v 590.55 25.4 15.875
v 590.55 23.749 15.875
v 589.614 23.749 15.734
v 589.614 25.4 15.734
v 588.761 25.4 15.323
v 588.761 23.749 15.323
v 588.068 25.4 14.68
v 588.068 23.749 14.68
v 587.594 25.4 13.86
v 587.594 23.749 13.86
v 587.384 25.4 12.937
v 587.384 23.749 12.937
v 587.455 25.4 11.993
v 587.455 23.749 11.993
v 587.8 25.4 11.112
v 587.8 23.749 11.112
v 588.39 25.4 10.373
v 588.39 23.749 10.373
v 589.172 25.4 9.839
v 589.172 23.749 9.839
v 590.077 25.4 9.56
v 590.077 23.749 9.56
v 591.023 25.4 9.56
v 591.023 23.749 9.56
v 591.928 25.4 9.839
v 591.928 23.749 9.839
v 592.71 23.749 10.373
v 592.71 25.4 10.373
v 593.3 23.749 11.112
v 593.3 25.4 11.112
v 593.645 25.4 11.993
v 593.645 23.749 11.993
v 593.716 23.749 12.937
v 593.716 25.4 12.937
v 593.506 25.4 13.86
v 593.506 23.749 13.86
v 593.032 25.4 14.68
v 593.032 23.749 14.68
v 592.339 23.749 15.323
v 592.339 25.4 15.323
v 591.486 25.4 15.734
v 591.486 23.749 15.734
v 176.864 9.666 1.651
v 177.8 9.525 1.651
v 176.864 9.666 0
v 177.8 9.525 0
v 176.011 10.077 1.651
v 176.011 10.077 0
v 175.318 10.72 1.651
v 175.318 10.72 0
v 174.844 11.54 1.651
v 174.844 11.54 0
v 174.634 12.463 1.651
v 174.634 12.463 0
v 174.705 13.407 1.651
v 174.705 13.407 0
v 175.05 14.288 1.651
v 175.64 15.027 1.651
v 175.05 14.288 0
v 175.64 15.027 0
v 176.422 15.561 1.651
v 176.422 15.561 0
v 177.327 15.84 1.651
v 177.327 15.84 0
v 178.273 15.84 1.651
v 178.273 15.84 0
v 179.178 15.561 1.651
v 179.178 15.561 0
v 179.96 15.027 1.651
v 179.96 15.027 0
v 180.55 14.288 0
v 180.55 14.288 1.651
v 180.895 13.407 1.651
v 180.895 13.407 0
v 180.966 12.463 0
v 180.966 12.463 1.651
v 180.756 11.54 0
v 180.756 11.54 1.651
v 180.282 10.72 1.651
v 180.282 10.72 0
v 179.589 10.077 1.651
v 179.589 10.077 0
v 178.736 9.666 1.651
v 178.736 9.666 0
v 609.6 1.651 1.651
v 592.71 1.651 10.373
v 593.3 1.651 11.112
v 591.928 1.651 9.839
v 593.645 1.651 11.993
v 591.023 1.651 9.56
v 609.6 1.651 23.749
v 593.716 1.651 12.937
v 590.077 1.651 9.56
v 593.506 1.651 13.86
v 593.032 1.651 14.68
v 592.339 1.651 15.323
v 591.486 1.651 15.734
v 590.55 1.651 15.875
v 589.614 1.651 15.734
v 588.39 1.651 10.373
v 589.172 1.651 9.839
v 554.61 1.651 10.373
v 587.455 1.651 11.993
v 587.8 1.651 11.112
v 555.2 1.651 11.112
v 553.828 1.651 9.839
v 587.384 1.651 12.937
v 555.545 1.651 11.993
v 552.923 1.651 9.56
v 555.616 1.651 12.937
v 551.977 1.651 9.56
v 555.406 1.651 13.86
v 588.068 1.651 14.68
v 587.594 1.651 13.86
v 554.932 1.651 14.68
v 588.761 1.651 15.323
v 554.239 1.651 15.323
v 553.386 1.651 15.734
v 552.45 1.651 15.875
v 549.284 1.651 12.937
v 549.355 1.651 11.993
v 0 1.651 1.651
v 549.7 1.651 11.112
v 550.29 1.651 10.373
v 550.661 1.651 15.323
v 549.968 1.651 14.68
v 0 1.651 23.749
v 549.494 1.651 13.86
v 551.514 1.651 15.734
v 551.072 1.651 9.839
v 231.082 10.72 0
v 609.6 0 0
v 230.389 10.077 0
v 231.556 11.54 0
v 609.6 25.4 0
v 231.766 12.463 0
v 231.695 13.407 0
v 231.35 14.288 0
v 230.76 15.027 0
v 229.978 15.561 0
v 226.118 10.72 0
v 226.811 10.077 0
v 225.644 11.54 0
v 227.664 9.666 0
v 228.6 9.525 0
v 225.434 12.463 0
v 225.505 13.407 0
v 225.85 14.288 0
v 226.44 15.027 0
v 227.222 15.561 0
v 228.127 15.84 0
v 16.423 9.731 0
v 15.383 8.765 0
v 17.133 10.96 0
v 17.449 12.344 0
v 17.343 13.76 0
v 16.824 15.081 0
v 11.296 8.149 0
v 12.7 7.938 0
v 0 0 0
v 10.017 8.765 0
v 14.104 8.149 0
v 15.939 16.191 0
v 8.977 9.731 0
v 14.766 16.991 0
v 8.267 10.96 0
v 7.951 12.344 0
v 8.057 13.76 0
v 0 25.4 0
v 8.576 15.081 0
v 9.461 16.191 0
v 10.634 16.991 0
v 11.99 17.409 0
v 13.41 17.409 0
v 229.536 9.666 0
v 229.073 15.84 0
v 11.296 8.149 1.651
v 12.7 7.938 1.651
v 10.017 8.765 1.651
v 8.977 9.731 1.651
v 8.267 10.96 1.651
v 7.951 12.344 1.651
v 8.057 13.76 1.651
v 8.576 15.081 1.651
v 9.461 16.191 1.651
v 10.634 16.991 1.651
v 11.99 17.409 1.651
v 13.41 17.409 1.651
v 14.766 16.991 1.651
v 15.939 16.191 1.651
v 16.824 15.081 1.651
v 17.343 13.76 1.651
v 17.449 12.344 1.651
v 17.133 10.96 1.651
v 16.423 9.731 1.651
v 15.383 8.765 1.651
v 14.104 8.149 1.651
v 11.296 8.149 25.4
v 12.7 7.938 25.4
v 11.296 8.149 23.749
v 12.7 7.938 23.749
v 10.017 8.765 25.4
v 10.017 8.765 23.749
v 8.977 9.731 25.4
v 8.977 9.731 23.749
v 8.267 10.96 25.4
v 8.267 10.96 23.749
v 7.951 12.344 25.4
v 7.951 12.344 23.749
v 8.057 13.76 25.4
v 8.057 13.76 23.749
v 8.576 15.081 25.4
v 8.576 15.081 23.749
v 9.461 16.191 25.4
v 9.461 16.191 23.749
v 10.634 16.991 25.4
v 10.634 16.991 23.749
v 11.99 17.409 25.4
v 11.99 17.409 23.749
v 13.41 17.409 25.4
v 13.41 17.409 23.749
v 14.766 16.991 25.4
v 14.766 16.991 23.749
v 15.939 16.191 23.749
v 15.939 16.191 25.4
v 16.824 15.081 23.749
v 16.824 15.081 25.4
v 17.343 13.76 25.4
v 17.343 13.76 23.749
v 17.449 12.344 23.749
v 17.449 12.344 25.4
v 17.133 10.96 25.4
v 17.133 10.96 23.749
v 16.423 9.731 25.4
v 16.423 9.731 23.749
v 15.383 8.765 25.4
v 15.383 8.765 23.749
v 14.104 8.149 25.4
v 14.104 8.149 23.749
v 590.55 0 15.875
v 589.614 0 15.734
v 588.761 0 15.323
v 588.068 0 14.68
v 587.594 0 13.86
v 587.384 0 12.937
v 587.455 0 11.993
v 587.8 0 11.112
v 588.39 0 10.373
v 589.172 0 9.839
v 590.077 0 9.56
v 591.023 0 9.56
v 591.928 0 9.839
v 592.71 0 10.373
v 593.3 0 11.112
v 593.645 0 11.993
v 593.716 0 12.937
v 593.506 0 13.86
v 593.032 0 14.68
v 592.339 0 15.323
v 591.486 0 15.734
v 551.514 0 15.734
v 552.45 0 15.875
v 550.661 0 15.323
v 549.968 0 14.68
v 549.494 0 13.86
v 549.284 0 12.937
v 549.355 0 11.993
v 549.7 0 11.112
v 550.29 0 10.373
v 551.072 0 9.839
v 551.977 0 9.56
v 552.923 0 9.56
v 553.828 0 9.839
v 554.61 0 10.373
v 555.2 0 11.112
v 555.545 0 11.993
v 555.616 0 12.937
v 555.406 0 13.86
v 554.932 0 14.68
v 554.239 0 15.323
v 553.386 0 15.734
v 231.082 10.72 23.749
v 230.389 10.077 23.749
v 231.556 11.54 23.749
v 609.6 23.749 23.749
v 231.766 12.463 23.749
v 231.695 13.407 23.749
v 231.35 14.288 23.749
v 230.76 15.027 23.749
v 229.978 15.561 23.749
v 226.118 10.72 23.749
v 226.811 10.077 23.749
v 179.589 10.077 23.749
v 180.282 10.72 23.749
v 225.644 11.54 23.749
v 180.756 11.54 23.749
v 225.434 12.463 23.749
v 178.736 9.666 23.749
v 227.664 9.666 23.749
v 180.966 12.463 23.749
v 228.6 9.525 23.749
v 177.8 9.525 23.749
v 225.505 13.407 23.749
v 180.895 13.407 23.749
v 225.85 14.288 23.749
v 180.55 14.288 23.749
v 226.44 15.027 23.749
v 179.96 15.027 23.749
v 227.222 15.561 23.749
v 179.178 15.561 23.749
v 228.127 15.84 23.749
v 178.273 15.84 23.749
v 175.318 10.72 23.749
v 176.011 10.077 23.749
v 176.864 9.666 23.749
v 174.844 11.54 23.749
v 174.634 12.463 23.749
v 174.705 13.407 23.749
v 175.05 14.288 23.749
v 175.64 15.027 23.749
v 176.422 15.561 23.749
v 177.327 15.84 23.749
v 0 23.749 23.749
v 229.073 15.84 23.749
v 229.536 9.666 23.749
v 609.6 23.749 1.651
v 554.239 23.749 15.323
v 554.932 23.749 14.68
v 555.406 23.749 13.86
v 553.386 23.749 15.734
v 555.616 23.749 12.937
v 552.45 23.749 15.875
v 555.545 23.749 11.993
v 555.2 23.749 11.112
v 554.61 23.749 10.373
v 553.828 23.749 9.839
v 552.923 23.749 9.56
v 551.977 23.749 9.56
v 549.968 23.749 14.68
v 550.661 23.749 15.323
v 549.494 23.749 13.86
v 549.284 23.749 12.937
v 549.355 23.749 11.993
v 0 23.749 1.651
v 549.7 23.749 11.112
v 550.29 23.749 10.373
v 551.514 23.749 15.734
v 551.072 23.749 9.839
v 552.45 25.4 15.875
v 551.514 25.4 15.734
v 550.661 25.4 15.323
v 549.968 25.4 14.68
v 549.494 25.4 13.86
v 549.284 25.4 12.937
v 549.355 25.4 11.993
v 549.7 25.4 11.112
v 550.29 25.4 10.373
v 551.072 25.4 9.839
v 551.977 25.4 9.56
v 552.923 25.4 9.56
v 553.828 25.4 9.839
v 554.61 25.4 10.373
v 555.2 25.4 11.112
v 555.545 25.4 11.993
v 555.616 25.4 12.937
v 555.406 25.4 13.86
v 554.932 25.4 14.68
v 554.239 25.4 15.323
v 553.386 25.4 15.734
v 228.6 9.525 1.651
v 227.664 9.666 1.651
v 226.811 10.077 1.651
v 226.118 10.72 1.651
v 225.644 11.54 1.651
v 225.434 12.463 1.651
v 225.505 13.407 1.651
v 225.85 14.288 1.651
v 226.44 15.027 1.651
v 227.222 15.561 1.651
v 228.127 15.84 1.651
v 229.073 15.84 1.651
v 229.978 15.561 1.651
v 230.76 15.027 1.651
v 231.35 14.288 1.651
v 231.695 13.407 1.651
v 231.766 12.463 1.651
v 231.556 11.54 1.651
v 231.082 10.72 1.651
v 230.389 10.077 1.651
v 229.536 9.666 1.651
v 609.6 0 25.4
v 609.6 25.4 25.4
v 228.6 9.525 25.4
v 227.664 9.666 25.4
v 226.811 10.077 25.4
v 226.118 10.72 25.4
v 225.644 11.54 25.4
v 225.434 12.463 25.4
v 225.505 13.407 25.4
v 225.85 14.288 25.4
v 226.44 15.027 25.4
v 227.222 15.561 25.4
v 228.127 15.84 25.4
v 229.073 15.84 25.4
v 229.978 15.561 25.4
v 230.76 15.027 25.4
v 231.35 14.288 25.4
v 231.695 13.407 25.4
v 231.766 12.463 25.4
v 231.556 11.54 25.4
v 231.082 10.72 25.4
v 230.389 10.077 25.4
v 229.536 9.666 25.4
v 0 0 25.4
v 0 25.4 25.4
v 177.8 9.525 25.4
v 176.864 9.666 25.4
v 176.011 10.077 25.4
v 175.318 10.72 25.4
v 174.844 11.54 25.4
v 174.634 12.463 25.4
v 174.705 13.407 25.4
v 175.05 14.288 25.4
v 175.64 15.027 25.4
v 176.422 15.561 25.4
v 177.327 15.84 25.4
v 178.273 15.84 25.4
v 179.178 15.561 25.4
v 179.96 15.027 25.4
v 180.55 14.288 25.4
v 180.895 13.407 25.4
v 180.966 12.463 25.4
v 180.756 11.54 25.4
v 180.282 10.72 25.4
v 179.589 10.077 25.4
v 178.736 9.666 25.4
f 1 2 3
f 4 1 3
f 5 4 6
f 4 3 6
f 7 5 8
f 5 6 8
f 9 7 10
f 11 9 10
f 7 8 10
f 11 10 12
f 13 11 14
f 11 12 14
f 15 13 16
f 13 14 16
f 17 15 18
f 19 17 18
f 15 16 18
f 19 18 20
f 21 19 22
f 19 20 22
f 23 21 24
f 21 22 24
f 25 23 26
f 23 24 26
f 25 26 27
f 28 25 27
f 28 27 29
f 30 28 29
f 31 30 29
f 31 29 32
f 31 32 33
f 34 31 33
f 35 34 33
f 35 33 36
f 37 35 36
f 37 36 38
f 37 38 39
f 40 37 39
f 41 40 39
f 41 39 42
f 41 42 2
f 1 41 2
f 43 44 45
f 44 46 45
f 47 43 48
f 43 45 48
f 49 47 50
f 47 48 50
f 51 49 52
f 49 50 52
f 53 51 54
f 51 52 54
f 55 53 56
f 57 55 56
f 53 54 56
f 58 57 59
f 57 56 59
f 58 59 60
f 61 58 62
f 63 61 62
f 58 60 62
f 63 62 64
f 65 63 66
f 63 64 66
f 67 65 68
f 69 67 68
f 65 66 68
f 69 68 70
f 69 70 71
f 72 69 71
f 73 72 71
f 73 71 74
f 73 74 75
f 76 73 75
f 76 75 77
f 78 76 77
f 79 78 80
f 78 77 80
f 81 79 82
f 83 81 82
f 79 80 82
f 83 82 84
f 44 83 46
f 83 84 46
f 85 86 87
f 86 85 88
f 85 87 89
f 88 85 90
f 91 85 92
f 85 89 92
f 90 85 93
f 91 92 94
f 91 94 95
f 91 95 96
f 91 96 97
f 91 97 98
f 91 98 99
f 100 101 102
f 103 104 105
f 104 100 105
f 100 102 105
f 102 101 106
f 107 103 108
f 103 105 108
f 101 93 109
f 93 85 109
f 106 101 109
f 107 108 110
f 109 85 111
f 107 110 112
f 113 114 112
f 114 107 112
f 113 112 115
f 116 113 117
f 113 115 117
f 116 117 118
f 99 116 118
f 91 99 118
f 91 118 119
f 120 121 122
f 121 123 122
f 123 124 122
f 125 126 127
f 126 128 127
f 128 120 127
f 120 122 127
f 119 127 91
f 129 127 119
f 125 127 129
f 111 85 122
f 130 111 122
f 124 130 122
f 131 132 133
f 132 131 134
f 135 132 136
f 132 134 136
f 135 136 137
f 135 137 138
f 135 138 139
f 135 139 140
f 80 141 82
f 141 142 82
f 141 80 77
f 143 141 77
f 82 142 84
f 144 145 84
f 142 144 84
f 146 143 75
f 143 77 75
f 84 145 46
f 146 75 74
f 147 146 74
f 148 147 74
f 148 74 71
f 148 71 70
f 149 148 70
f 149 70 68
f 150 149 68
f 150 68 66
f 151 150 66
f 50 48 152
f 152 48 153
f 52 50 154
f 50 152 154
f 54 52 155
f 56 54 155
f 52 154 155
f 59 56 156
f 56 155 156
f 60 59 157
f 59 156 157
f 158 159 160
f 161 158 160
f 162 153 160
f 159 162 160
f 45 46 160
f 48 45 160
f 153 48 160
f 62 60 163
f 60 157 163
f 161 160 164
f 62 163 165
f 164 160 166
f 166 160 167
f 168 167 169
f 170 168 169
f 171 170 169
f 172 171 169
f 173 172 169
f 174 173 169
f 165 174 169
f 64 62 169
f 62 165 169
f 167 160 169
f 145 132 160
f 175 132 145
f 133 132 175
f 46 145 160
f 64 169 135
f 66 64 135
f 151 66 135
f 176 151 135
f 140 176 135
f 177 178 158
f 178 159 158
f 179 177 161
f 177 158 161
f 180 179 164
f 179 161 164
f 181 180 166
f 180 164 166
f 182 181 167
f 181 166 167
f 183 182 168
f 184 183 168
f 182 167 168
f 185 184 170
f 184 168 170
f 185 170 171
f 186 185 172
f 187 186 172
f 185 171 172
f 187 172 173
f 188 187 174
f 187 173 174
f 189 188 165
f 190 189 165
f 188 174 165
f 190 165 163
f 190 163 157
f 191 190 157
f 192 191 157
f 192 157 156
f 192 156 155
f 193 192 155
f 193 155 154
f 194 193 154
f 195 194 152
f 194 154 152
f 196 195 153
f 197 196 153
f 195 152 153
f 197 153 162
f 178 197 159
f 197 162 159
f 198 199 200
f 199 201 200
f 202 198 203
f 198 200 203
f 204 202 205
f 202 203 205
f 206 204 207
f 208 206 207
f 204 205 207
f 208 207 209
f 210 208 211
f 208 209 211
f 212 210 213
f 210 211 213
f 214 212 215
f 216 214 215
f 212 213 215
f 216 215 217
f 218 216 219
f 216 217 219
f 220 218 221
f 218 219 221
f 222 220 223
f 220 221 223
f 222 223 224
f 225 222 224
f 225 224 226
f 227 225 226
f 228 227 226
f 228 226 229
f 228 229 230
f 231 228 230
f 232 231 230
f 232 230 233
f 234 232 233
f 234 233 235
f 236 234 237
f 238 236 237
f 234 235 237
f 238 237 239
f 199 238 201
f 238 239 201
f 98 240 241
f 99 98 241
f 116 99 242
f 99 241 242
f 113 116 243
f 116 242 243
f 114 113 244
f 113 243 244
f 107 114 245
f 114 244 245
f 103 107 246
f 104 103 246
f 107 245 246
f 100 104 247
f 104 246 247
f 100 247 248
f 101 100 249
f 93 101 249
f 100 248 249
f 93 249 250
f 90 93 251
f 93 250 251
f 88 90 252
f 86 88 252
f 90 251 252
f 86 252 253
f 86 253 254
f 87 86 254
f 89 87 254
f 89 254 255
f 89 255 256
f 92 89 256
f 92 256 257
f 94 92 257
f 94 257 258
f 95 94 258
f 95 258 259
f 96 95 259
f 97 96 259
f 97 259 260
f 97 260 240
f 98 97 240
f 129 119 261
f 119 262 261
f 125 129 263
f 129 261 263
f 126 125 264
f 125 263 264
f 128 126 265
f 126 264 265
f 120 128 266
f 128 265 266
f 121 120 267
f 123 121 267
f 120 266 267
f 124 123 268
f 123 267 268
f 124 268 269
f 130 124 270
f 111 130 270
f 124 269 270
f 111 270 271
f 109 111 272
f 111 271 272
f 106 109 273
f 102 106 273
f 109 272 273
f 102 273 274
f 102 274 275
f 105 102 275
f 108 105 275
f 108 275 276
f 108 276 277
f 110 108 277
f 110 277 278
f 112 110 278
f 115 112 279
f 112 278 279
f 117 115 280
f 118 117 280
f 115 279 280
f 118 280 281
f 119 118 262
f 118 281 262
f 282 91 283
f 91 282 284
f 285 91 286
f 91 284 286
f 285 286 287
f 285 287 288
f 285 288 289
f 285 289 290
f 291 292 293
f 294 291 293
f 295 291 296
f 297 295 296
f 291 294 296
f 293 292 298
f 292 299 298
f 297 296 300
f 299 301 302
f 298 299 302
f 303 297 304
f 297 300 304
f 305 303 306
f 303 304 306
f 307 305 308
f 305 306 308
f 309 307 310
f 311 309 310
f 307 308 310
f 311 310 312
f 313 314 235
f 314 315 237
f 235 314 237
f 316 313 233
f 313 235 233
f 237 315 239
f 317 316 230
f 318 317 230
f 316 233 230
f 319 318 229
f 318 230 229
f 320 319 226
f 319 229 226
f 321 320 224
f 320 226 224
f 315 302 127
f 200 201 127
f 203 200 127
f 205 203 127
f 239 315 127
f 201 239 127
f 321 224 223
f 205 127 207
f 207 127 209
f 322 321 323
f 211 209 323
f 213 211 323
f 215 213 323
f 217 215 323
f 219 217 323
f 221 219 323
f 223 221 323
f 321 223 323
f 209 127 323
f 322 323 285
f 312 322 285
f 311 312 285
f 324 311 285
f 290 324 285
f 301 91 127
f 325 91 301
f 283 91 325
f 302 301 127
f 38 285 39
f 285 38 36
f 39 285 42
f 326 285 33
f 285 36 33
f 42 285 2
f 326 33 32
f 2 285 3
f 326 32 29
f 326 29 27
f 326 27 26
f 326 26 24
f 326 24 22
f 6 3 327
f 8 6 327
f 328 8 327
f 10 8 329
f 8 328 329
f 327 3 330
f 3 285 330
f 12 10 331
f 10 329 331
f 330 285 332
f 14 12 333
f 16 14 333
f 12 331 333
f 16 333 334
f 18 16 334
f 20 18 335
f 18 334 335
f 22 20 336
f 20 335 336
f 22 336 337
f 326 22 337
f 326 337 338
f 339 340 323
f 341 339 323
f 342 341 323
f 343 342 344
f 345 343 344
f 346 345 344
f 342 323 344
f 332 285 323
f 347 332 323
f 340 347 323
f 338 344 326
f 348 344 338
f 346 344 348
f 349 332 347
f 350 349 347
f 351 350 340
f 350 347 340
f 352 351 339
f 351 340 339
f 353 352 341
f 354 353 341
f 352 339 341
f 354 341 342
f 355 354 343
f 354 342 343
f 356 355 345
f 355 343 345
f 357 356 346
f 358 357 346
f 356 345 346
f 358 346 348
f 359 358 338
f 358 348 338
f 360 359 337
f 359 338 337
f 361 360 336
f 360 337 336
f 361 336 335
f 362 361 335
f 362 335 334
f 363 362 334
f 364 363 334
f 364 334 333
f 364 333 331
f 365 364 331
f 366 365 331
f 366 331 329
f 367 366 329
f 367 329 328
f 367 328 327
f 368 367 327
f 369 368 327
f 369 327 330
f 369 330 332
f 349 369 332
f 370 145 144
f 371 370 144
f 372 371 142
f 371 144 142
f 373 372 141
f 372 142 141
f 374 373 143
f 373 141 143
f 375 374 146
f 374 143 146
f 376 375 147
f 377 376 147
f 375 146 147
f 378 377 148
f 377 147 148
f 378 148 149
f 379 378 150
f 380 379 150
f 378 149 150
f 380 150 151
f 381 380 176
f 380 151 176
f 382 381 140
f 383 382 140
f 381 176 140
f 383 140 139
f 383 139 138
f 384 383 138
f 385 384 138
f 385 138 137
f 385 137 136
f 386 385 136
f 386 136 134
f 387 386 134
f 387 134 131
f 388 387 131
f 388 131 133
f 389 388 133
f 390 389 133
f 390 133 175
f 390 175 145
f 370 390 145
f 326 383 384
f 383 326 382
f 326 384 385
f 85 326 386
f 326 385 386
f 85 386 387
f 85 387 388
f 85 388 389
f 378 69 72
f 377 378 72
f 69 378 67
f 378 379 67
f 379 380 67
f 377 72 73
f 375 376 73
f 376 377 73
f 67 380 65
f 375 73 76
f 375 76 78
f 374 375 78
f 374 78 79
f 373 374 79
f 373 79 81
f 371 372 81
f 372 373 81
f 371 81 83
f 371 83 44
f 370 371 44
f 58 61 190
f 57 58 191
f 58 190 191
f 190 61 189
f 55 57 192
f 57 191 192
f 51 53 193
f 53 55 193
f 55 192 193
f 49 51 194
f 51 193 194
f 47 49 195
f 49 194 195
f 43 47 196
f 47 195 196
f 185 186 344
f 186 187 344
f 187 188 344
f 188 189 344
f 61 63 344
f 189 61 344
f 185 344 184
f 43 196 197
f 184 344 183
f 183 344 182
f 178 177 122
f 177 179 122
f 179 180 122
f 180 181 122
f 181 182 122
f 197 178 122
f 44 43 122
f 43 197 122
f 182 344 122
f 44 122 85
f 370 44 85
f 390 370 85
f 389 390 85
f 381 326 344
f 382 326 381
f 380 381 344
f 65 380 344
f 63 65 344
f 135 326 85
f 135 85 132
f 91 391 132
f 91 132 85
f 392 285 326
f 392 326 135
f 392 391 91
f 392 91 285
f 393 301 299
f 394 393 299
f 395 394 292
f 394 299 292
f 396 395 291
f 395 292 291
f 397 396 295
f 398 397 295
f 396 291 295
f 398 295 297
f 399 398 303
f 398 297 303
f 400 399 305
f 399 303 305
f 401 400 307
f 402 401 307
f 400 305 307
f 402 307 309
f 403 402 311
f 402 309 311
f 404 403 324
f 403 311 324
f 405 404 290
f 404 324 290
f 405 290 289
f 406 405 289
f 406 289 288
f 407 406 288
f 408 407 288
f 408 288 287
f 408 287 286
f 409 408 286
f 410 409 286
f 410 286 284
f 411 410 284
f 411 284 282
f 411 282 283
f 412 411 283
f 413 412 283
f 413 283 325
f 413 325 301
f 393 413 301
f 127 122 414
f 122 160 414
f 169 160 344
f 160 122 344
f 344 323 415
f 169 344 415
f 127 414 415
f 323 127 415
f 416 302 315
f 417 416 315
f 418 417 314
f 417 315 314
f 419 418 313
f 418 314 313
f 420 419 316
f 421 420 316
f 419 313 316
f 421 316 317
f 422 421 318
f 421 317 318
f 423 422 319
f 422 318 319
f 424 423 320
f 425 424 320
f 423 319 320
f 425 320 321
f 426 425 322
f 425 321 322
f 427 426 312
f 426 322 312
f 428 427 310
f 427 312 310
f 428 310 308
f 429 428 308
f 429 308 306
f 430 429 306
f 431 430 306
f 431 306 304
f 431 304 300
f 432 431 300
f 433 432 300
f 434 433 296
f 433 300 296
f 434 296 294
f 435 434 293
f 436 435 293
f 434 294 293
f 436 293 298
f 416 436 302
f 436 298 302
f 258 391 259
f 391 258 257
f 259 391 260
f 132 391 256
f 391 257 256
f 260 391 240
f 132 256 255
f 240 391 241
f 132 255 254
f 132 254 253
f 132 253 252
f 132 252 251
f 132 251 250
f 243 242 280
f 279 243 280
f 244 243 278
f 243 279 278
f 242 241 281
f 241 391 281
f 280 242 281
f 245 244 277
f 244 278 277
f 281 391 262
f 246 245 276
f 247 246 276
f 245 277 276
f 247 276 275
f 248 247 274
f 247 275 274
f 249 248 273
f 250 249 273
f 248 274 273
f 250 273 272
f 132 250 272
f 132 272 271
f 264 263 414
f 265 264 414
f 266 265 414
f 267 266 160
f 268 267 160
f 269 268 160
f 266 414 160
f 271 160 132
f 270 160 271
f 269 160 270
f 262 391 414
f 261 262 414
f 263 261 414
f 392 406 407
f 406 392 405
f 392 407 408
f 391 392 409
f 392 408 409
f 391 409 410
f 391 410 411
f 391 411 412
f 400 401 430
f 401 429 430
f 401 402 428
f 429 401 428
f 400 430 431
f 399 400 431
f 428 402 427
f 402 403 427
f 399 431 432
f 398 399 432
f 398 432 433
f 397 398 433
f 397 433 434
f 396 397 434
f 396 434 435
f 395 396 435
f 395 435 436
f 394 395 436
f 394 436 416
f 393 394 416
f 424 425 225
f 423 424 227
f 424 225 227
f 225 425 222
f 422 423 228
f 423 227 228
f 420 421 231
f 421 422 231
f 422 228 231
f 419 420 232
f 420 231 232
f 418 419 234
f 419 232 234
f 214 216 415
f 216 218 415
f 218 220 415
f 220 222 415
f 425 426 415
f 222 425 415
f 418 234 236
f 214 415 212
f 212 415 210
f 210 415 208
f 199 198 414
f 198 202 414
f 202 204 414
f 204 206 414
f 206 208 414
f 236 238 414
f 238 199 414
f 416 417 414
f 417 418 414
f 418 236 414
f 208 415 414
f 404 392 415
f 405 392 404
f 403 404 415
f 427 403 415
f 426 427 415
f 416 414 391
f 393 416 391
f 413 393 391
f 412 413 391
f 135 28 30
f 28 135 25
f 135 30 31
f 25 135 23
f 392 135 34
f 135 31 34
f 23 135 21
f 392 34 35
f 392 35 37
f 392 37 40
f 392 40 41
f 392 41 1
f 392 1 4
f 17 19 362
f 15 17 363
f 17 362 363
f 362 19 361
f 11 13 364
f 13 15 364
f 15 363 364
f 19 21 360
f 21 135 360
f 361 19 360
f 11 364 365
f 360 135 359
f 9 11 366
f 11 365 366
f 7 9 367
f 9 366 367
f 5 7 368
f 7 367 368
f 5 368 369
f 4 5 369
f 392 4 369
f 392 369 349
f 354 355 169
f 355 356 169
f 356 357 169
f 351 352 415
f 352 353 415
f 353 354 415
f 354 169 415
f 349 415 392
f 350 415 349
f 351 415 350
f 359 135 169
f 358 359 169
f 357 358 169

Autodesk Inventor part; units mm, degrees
ref_plane "YZ Plane" through (0, 0, 0) normal (1, 0, 0) x (0, 1, 0)
ref_plane "XZ Plane" through (0, 0, 0) normal (0, 1, 0) x (-1, 0, 0)
ref_plane "XY Plane" through (0, 0, 0) normal (0, 0, 1) x (1, 0, 0)
sketch "Sketch1" plane through (0, 0, 0) normal (1, 0, 0) x (0, 1, 0)
  line L0 (0, 0) -> (25.4, 0)
  line L1 (25.4, 0) -> (25.4, 25.4)
  line L2 (25.4, 25.4) -> (0, 25.4)
  line L3 (0, 25.4) -> (0, 0)
  line L4 (1.651, 23.749) -> (23.749, 23.749)
  line L5 (23.749, 23.749) -> (23.749, 1.651)
  line L6 (23.749, 1.651) -> (1.651, 1.651)
  line L7 (1.651, 1.651) -> (1.651, 23.749)
  dimension "d0" = 25.4
  dimension "d2" = 25.4
  dimension "d3" = 1.651
  dimension "d5" = 1.651
  dimension "d6" = 1.651
  dimension "d7" = 1.651
extrude "Extrusion1" add sketch "Sketch1" along normal blind 609.6
sketch "Sketch2" plane through (0, 0, 25.4) normal (0, 0, 1) x (1, 0, 0)
  line L0 (0, 25.4) -> (0, 0) projected
  line L1 (0, 25.4) -> (609.6, 25.4) projected
  point P0 (12.7, 12.7)
  dimension "d10" = 12.7
  dimension "d11" = 12.7
hole "Hole1" at (12.7, 12.7, 25.4) direction (0, 0, -1) diameter 9.525 end through all
sketch "Sketch3" plane through (0, 25.4, 25.4) normal (0, 1, 0) x (1, 0, 0)
  line L0 (609.6, 25.4) -> (609.6, 0) projected
  point P0 (590.55, 12.7)
  point P1 (552.45, 12.7)
  dimension "d19" = 19.05
  dimension "d20" = 38.1
hole "Hole2" at (590.55, 25.4, 12.7) at (552.45, 25.4, 12.7) direction (0, -1, 0) diameter 6.35 end through all
sketch "Sketch4" plane through (0, 0, 25.4) normal (0, 0, 1) x (1, 0, 0)
  line L0 (0, 25.4) -> (0, 0) projected
  line L1 (0, 0) -> (609.6, 0) projected
  line L2 (0, 25.4) -> (609.6, 25.4) projected
  point P0 (177.8, 12.7)
  point P1 (228.6, 12.7)
  dimension "d28" = 177.8
  dimension "d29" = 12.7
  dimension "d37" = 12.7
  dimension "d38" = 50.8
hole "Hole3" at (177.8, 12.7, 25.4) at (228.6, 12.7, 25.4) direction (0, 0, -1) diameter 6.35 end through all
properties part number "ArmBAr" material "Aluminum 6061"
